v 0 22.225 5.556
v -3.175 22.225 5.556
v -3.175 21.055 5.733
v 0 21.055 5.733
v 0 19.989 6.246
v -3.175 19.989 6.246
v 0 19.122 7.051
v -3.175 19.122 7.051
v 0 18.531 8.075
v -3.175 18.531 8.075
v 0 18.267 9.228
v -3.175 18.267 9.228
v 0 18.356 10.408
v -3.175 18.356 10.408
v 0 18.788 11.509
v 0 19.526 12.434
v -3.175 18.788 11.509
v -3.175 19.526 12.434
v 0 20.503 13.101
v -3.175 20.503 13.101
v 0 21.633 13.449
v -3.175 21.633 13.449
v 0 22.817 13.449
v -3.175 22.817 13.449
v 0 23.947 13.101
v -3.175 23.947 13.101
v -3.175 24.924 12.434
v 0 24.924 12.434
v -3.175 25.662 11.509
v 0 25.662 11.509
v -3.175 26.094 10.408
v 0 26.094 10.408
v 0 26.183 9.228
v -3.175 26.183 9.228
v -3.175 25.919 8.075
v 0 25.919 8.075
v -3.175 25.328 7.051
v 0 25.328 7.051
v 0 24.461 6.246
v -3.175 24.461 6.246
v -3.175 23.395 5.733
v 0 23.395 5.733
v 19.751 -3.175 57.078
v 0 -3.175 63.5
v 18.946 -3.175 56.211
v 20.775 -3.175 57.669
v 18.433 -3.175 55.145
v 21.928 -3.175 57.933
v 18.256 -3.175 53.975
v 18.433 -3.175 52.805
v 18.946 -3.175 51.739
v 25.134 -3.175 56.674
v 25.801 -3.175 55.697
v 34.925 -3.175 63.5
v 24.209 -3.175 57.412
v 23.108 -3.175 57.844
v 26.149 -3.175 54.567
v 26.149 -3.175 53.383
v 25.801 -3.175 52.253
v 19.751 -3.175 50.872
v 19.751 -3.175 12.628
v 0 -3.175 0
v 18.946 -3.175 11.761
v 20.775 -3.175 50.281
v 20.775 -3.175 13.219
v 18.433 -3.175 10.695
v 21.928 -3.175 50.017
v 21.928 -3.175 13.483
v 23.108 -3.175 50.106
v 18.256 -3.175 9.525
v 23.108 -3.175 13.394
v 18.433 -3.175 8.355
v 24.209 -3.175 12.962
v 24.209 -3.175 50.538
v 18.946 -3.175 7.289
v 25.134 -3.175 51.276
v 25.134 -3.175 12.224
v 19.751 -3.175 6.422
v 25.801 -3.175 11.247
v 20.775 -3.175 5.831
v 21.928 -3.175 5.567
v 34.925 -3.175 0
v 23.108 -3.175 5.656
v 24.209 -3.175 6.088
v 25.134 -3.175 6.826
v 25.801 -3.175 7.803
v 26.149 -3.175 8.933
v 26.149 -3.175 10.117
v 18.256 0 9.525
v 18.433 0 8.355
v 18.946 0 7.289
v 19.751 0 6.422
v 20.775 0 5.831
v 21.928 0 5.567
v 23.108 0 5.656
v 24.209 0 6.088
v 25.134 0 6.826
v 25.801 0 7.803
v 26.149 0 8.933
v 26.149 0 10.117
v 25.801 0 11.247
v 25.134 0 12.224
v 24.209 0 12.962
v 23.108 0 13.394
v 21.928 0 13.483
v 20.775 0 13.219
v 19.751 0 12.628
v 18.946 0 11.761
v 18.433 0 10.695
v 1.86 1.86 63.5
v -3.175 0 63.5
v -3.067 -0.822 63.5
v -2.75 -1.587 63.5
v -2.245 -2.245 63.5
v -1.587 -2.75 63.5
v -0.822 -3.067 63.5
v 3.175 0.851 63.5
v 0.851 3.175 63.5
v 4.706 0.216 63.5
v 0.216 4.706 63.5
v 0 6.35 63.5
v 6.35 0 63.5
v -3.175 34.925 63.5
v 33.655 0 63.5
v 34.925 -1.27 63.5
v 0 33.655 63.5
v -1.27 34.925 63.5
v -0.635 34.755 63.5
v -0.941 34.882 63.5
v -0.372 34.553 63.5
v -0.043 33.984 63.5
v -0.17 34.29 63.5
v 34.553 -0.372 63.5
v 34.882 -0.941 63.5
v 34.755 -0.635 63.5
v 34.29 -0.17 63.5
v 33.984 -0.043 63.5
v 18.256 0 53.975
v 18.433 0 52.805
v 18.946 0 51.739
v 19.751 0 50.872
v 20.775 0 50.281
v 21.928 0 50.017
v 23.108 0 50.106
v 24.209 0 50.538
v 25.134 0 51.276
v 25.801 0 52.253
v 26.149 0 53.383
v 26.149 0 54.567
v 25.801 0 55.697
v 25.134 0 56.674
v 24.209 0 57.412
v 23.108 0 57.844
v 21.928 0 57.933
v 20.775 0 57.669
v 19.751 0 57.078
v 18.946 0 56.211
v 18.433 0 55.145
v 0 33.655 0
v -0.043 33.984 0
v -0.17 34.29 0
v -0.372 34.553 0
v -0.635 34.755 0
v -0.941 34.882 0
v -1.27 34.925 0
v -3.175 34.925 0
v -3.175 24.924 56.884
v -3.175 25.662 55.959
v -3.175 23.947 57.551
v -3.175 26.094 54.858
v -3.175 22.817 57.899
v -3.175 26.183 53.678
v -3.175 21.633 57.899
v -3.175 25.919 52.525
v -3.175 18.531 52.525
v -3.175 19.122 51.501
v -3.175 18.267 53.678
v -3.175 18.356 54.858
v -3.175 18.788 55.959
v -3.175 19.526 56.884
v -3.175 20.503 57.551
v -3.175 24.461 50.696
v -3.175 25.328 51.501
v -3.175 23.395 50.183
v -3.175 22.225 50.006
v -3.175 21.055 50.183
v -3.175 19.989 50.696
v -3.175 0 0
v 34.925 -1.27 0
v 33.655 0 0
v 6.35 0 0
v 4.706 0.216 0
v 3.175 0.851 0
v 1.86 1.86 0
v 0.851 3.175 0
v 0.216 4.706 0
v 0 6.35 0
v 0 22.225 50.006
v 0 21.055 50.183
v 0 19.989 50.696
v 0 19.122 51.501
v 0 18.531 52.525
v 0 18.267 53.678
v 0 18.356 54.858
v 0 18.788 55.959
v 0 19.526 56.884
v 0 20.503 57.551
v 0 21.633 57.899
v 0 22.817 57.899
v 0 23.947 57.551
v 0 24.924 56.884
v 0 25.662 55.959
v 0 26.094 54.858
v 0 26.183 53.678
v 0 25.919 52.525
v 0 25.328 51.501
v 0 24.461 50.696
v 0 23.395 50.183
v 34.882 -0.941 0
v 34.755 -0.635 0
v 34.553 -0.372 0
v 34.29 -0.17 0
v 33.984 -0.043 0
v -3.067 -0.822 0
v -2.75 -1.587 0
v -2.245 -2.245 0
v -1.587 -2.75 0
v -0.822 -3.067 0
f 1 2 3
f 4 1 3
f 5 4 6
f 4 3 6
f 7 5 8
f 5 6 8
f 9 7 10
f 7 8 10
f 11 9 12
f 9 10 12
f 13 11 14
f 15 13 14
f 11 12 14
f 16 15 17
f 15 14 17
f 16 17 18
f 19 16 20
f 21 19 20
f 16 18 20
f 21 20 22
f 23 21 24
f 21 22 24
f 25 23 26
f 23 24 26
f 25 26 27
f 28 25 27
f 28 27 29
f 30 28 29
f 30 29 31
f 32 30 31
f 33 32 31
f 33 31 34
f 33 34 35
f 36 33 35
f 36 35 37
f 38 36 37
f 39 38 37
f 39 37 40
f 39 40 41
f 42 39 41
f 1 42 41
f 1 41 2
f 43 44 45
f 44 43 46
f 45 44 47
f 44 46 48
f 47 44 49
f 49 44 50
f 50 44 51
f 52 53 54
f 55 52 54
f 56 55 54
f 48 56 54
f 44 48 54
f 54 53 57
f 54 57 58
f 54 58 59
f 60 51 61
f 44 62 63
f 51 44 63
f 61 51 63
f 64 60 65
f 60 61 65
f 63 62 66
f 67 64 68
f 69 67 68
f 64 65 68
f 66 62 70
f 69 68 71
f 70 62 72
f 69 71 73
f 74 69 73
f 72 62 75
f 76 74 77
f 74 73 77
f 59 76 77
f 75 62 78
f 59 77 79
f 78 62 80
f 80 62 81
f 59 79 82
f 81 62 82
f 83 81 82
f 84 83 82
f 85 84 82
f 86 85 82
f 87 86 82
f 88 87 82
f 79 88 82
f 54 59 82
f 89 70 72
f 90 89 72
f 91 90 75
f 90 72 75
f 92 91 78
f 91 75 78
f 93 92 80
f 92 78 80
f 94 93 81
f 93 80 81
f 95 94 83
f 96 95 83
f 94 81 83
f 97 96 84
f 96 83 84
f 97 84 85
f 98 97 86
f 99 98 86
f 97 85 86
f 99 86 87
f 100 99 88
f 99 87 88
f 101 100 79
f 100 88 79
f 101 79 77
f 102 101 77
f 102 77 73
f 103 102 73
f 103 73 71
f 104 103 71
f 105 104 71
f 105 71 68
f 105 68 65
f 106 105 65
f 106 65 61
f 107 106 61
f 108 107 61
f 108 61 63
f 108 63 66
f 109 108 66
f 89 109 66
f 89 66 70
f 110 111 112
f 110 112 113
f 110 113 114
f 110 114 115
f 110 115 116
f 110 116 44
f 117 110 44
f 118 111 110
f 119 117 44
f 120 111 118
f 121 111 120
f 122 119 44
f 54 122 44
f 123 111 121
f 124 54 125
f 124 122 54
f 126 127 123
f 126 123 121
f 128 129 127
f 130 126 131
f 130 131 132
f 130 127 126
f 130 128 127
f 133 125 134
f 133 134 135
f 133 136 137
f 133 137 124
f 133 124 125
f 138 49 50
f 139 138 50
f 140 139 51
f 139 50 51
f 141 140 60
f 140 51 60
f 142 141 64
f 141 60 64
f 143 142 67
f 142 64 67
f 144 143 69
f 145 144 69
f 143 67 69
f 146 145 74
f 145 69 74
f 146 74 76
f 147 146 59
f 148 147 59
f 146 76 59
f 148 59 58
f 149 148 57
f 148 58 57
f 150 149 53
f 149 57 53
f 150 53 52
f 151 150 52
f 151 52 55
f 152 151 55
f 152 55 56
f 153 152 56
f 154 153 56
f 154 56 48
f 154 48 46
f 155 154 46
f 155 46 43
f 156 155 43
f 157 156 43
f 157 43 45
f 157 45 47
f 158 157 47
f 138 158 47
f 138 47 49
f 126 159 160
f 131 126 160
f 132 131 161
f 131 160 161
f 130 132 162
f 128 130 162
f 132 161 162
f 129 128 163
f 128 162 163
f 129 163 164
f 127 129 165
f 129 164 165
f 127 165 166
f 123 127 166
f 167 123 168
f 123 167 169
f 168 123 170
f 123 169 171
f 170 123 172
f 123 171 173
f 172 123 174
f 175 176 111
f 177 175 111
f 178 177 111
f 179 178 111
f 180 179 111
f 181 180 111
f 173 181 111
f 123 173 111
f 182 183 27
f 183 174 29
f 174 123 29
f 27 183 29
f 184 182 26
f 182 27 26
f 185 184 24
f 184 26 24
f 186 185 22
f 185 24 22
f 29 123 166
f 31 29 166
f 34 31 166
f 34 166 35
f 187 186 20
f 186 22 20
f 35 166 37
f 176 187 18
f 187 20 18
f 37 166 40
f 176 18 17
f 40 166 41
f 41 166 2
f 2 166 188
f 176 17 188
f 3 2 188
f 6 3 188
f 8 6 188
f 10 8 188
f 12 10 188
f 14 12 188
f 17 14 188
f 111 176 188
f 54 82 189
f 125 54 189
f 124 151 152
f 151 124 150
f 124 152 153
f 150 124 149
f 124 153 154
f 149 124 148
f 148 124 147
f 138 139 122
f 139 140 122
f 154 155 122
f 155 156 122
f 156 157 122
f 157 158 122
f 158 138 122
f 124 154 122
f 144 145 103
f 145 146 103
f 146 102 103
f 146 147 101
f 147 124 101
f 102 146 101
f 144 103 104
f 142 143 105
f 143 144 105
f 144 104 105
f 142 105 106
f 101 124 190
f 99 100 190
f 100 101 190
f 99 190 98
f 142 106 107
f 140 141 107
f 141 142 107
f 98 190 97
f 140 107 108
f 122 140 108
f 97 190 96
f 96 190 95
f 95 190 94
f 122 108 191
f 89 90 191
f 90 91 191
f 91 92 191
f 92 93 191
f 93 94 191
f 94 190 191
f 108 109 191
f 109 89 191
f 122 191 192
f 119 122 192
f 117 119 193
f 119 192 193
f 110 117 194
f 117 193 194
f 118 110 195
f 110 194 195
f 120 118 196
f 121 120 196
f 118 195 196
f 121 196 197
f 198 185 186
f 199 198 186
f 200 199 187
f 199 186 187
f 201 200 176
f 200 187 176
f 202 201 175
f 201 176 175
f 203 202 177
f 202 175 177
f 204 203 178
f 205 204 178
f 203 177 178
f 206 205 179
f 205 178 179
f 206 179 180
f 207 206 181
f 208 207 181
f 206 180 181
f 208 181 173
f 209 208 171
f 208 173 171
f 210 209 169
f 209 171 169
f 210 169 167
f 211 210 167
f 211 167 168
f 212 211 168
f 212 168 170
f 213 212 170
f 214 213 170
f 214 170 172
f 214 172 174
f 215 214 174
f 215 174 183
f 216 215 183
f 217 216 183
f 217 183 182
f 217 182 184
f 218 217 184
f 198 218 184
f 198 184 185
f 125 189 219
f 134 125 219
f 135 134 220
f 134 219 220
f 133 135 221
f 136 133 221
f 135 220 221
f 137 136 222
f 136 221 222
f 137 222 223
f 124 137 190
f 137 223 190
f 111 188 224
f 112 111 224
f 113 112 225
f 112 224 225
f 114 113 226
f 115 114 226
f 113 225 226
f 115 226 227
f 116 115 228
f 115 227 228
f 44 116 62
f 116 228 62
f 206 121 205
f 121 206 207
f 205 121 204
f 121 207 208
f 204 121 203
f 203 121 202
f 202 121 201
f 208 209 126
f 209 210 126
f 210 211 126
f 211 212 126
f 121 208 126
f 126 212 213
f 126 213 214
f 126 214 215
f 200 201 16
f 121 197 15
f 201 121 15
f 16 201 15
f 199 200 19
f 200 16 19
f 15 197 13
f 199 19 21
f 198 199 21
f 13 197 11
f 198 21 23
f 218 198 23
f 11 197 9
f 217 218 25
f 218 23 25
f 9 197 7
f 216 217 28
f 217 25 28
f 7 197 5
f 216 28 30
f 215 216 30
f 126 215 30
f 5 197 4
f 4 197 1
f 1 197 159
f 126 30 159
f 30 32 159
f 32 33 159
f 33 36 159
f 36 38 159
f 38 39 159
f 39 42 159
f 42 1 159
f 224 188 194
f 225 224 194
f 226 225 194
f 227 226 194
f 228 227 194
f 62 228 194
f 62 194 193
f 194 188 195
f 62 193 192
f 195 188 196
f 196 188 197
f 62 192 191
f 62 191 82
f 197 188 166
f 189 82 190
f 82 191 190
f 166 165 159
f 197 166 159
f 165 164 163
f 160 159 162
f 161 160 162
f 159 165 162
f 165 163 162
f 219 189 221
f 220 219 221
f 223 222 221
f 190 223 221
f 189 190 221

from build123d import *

# Parameters (mm, degrees)
BOSS_EXTRUDE1_DEPTH                      = 63.5
F_5_16_0_3125_DIAMETER_HOLE1_D           = 7.9375
F_5_16_0_3125_DIAMETER_HOLE1_ON_FACE_2_D = 7.9375


with BuildPart() as part:
    # Sketch3 → Boss-Extrude1 (new body)
    with BuildSketch(Plane.XY):
        with BuildLine():
            Line((0, 6.35), (0, 33.655))
            ThreePointArc((0, 33.655), (-0.371974388, 34.553025612), (-1.27, 34.925))
            Line((-1.27, 34.925), (-3.175, 34.925))
            Line((-3.175, 34.925), (-3.175, 0))
            ThreePointArc((-3.175, 0), (-2.24506403, -2.24506403), (0, -3.175))
            Line((0, -3.175), (34.925, -3.175))
            Line((34.925, -3.175), (34.925, -1.27))
            ThreePointArc((34.925, -1.27), (34.553025612, -0.371974388), (33.655, 0))
            Line((33.655, 0), (6.35, 0))
            ThreePointArc((6.35, 0), (1.859871939, 1.859871939), (0, 6.35))
        make_face()
    extrude(amount=BOSS_EXTRUDE1_DEPTH)

    # 5/16 (0.3125) Diameter Hole1 (through all)
    with Locations(Plane(origin=(22.225, 0, 53.975), x_dir=(1, 0, 0), z_dir=(0, 1, 0))):
        with Locations((0, 0), (0, 44.45)):
            Hole(F_5_16_0_3125_DIAMETER_HOLE1_D / 2)

    # 5/16 (0.3125) Diameter Hole1 on face 2 (through all)
    with Locations(Plane(origin=(0, 22.225, 9.525), x_dir=(0, 0, 1), z_dir=(1, 0, 0))):
        with Locations((0, 0), (44.45, 0)):
            Hole(F_5_16_0_3125_DIAMETER_HOLE1_ON_FACE_2_D / 2)


solid = part.part
